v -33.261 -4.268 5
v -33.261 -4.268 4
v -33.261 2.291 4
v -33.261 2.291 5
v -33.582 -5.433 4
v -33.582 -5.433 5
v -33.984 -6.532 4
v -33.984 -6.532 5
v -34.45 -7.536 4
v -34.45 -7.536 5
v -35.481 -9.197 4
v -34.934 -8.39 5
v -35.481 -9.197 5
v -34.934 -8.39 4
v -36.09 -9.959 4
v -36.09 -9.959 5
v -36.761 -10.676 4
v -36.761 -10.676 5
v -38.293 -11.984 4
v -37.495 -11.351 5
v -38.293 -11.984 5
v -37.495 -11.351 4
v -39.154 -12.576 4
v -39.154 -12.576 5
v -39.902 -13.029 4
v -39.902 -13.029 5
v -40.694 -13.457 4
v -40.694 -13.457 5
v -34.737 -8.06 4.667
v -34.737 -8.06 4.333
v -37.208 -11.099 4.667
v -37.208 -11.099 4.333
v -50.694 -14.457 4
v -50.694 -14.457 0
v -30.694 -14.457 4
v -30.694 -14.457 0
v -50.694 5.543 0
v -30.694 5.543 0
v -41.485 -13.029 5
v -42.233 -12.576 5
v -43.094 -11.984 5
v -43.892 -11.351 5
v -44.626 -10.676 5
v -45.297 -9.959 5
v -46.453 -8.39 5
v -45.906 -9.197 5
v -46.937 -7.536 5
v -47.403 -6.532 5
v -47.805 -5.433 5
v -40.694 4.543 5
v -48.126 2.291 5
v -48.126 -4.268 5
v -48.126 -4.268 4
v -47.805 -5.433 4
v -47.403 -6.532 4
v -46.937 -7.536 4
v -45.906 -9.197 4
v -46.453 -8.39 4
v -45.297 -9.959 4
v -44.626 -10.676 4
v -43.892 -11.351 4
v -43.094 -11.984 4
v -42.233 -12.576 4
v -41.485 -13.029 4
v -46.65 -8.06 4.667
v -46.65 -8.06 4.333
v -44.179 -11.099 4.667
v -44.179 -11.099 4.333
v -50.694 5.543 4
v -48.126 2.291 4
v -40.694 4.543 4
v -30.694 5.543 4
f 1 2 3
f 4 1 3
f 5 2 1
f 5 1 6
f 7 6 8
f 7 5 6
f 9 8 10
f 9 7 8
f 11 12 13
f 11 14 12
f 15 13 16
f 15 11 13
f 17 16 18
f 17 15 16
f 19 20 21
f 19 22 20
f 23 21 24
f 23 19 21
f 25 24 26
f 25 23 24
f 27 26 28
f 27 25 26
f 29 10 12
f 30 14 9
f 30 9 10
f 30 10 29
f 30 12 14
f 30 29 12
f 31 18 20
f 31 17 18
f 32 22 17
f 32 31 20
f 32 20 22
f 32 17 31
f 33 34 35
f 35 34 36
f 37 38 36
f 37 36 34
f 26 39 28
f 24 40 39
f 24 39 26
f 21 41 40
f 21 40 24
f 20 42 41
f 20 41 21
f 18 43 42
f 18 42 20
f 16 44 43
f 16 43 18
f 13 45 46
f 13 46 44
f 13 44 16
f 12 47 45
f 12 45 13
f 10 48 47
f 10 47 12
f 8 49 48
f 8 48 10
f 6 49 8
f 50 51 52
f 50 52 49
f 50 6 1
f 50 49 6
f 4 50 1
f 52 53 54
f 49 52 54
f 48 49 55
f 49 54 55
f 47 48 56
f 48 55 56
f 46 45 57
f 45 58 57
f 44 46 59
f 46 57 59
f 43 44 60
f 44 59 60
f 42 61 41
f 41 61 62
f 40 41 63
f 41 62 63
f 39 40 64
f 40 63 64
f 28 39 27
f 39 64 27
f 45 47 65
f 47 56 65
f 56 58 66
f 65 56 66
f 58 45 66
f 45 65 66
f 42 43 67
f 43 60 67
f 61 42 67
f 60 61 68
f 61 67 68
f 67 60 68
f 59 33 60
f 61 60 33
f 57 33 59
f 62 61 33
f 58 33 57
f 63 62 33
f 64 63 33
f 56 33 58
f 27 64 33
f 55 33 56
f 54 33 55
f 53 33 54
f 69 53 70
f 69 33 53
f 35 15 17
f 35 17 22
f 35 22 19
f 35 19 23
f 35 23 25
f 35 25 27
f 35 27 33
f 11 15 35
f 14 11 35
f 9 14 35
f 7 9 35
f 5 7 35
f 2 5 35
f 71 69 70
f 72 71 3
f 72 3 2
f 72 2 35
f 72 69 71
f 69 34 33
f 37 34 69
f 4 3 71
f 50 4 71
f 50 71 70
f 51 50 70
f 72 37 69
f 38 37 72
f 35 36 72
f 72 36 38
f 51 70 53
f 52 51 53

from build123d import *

# Parameters (mm, degrees)
F0_W     = 20
F0_H     = 20
F1_DEPTH = 4
F2_DEPTH = 5
F3_DEPTH = 5


with BuildPart() as f1:
    # F0 (on Top) → F1 (new body)
    with BuildSketch(Plane.XY):
        with Locations((-40.693533, -4.456982)):
            Rectangle(F0_W, F0_H)
        with BuildLine():
            Line((-48.125807, -4.26834), (-48.125807, 2.291039))
            Line((-48.125807, 2.291039), (-40.693533, 4.543018))
            Line((-40.693533, 4.543018), (-33.261258, 2.291039))
            Line((-33.261258, 2.291039), (-33.261258, -4.26834))
            add(Edge.make_bspline(
                [(-33.261258, -4.26834), (-34.245458, -8.461894), (-36.694674, -11.414499), (-40.693533, -13.456982)],
                knots=[0, 0, 0, 0, 11.8182, 11.8182, 11.8182, 11.8182], degree=3))
            add(Edge.make_bspline(
                [(-48.125807, -4.26834), (-47.141608, -8.461894), (-44.692392, -11.414499), (-40.693533, -13.456982)],
                knots=[0, 0, 0, 0, 11.8182, 11.8182, 11.8182, 11.8182], degree=3))
        make_face(mode=Mode.SUBTRACT)
    extrude(amount=F1_DEPTH)

    # F0 (on Top) → F2 (join)
    with BuildSketch(Plane.XY):
        with BuildLine():
            Line((-40.693533, 4.543018), (-48.125807, 2.291039))
            Line((-48.125807, 2.291039), (-48.125807, -4.26834))
            add(Edge.make_bspline(
                [(-48.125807, -4.26834), (-47.141608, -8.461894), (-44.692392, -11.414499), (-40.693533, -13.456982)],
                knots=[0, 0, 0, 0, 11.8182, 11.8182, 11.8182, 11.8182], degree=3))
            add(Edge.make_bspline(
                [(-33.261258, -4.26834), (-34.245458, -8.461894), (-36.694674, -11.414499), (-40.693533, -13.456982)],
                knots=[0, 0, 0, 0, 11.8182, 11.8182, 11.8182, 11.8182], degree=3))
            Line((-33.261258, -4.26834), (-33.261258, 2.291039))
            Line((-33.261258, 2.291039), (-40.693533, 4.543018))
        make_face()
        with BuildLine():
            Line((-40.693533, 3.262941), (-40.693533, -12.135648))
            add(Edge.make_bspline(
                [(-40.693533, -12.135648), (-44.436548, -10.041109), (-47.01202, -6.495423), (-47.08004, -3.659984)],
                knots=[0, 0, 0, 0, 10.612463, 10.612463, 10.612463, 10.612463], degree=3))
            Line((-47.08004, -3.659984), (-47.08004, 1.440438))
            Line((-47.08004, 1.440438), (-40.693533, 3.340149))
            Line((-40.693533, 3.340149), (-40.693533, 3.262941))
        make_face(mode=Mode.SUBTRACT)
    extrude(amount=F2_DEPTH)

    # F0 (on Top) → F3 (join)
    with BuildSketch(Plane.XY):
        with BuildLine():
            add(Edge.make_bspline(
                [(-40.693533, -12.135648), (-44.436548, -10.041109), (-47.01202, -6.495423), (-47.08004, -3.659984)],
                knots=[0, 0, 0, 0, 10.612463, 10.612463, 10.612463, 10.612463], degree=3))
            Line((-40.693533, -12.135648), (-40.693533, 3.262941))
            Line((-40.693533, 3.262941), (-40.693533, 3.340149))
            Line((-40.693533, 3.340149), (-47.08004, 1.440438))
            Line((-47.08004, 1.440438), (-47.08004, -3.659984))
        make_face()
    extrude(amount=F3_DEPTH)


solid = f1.part
